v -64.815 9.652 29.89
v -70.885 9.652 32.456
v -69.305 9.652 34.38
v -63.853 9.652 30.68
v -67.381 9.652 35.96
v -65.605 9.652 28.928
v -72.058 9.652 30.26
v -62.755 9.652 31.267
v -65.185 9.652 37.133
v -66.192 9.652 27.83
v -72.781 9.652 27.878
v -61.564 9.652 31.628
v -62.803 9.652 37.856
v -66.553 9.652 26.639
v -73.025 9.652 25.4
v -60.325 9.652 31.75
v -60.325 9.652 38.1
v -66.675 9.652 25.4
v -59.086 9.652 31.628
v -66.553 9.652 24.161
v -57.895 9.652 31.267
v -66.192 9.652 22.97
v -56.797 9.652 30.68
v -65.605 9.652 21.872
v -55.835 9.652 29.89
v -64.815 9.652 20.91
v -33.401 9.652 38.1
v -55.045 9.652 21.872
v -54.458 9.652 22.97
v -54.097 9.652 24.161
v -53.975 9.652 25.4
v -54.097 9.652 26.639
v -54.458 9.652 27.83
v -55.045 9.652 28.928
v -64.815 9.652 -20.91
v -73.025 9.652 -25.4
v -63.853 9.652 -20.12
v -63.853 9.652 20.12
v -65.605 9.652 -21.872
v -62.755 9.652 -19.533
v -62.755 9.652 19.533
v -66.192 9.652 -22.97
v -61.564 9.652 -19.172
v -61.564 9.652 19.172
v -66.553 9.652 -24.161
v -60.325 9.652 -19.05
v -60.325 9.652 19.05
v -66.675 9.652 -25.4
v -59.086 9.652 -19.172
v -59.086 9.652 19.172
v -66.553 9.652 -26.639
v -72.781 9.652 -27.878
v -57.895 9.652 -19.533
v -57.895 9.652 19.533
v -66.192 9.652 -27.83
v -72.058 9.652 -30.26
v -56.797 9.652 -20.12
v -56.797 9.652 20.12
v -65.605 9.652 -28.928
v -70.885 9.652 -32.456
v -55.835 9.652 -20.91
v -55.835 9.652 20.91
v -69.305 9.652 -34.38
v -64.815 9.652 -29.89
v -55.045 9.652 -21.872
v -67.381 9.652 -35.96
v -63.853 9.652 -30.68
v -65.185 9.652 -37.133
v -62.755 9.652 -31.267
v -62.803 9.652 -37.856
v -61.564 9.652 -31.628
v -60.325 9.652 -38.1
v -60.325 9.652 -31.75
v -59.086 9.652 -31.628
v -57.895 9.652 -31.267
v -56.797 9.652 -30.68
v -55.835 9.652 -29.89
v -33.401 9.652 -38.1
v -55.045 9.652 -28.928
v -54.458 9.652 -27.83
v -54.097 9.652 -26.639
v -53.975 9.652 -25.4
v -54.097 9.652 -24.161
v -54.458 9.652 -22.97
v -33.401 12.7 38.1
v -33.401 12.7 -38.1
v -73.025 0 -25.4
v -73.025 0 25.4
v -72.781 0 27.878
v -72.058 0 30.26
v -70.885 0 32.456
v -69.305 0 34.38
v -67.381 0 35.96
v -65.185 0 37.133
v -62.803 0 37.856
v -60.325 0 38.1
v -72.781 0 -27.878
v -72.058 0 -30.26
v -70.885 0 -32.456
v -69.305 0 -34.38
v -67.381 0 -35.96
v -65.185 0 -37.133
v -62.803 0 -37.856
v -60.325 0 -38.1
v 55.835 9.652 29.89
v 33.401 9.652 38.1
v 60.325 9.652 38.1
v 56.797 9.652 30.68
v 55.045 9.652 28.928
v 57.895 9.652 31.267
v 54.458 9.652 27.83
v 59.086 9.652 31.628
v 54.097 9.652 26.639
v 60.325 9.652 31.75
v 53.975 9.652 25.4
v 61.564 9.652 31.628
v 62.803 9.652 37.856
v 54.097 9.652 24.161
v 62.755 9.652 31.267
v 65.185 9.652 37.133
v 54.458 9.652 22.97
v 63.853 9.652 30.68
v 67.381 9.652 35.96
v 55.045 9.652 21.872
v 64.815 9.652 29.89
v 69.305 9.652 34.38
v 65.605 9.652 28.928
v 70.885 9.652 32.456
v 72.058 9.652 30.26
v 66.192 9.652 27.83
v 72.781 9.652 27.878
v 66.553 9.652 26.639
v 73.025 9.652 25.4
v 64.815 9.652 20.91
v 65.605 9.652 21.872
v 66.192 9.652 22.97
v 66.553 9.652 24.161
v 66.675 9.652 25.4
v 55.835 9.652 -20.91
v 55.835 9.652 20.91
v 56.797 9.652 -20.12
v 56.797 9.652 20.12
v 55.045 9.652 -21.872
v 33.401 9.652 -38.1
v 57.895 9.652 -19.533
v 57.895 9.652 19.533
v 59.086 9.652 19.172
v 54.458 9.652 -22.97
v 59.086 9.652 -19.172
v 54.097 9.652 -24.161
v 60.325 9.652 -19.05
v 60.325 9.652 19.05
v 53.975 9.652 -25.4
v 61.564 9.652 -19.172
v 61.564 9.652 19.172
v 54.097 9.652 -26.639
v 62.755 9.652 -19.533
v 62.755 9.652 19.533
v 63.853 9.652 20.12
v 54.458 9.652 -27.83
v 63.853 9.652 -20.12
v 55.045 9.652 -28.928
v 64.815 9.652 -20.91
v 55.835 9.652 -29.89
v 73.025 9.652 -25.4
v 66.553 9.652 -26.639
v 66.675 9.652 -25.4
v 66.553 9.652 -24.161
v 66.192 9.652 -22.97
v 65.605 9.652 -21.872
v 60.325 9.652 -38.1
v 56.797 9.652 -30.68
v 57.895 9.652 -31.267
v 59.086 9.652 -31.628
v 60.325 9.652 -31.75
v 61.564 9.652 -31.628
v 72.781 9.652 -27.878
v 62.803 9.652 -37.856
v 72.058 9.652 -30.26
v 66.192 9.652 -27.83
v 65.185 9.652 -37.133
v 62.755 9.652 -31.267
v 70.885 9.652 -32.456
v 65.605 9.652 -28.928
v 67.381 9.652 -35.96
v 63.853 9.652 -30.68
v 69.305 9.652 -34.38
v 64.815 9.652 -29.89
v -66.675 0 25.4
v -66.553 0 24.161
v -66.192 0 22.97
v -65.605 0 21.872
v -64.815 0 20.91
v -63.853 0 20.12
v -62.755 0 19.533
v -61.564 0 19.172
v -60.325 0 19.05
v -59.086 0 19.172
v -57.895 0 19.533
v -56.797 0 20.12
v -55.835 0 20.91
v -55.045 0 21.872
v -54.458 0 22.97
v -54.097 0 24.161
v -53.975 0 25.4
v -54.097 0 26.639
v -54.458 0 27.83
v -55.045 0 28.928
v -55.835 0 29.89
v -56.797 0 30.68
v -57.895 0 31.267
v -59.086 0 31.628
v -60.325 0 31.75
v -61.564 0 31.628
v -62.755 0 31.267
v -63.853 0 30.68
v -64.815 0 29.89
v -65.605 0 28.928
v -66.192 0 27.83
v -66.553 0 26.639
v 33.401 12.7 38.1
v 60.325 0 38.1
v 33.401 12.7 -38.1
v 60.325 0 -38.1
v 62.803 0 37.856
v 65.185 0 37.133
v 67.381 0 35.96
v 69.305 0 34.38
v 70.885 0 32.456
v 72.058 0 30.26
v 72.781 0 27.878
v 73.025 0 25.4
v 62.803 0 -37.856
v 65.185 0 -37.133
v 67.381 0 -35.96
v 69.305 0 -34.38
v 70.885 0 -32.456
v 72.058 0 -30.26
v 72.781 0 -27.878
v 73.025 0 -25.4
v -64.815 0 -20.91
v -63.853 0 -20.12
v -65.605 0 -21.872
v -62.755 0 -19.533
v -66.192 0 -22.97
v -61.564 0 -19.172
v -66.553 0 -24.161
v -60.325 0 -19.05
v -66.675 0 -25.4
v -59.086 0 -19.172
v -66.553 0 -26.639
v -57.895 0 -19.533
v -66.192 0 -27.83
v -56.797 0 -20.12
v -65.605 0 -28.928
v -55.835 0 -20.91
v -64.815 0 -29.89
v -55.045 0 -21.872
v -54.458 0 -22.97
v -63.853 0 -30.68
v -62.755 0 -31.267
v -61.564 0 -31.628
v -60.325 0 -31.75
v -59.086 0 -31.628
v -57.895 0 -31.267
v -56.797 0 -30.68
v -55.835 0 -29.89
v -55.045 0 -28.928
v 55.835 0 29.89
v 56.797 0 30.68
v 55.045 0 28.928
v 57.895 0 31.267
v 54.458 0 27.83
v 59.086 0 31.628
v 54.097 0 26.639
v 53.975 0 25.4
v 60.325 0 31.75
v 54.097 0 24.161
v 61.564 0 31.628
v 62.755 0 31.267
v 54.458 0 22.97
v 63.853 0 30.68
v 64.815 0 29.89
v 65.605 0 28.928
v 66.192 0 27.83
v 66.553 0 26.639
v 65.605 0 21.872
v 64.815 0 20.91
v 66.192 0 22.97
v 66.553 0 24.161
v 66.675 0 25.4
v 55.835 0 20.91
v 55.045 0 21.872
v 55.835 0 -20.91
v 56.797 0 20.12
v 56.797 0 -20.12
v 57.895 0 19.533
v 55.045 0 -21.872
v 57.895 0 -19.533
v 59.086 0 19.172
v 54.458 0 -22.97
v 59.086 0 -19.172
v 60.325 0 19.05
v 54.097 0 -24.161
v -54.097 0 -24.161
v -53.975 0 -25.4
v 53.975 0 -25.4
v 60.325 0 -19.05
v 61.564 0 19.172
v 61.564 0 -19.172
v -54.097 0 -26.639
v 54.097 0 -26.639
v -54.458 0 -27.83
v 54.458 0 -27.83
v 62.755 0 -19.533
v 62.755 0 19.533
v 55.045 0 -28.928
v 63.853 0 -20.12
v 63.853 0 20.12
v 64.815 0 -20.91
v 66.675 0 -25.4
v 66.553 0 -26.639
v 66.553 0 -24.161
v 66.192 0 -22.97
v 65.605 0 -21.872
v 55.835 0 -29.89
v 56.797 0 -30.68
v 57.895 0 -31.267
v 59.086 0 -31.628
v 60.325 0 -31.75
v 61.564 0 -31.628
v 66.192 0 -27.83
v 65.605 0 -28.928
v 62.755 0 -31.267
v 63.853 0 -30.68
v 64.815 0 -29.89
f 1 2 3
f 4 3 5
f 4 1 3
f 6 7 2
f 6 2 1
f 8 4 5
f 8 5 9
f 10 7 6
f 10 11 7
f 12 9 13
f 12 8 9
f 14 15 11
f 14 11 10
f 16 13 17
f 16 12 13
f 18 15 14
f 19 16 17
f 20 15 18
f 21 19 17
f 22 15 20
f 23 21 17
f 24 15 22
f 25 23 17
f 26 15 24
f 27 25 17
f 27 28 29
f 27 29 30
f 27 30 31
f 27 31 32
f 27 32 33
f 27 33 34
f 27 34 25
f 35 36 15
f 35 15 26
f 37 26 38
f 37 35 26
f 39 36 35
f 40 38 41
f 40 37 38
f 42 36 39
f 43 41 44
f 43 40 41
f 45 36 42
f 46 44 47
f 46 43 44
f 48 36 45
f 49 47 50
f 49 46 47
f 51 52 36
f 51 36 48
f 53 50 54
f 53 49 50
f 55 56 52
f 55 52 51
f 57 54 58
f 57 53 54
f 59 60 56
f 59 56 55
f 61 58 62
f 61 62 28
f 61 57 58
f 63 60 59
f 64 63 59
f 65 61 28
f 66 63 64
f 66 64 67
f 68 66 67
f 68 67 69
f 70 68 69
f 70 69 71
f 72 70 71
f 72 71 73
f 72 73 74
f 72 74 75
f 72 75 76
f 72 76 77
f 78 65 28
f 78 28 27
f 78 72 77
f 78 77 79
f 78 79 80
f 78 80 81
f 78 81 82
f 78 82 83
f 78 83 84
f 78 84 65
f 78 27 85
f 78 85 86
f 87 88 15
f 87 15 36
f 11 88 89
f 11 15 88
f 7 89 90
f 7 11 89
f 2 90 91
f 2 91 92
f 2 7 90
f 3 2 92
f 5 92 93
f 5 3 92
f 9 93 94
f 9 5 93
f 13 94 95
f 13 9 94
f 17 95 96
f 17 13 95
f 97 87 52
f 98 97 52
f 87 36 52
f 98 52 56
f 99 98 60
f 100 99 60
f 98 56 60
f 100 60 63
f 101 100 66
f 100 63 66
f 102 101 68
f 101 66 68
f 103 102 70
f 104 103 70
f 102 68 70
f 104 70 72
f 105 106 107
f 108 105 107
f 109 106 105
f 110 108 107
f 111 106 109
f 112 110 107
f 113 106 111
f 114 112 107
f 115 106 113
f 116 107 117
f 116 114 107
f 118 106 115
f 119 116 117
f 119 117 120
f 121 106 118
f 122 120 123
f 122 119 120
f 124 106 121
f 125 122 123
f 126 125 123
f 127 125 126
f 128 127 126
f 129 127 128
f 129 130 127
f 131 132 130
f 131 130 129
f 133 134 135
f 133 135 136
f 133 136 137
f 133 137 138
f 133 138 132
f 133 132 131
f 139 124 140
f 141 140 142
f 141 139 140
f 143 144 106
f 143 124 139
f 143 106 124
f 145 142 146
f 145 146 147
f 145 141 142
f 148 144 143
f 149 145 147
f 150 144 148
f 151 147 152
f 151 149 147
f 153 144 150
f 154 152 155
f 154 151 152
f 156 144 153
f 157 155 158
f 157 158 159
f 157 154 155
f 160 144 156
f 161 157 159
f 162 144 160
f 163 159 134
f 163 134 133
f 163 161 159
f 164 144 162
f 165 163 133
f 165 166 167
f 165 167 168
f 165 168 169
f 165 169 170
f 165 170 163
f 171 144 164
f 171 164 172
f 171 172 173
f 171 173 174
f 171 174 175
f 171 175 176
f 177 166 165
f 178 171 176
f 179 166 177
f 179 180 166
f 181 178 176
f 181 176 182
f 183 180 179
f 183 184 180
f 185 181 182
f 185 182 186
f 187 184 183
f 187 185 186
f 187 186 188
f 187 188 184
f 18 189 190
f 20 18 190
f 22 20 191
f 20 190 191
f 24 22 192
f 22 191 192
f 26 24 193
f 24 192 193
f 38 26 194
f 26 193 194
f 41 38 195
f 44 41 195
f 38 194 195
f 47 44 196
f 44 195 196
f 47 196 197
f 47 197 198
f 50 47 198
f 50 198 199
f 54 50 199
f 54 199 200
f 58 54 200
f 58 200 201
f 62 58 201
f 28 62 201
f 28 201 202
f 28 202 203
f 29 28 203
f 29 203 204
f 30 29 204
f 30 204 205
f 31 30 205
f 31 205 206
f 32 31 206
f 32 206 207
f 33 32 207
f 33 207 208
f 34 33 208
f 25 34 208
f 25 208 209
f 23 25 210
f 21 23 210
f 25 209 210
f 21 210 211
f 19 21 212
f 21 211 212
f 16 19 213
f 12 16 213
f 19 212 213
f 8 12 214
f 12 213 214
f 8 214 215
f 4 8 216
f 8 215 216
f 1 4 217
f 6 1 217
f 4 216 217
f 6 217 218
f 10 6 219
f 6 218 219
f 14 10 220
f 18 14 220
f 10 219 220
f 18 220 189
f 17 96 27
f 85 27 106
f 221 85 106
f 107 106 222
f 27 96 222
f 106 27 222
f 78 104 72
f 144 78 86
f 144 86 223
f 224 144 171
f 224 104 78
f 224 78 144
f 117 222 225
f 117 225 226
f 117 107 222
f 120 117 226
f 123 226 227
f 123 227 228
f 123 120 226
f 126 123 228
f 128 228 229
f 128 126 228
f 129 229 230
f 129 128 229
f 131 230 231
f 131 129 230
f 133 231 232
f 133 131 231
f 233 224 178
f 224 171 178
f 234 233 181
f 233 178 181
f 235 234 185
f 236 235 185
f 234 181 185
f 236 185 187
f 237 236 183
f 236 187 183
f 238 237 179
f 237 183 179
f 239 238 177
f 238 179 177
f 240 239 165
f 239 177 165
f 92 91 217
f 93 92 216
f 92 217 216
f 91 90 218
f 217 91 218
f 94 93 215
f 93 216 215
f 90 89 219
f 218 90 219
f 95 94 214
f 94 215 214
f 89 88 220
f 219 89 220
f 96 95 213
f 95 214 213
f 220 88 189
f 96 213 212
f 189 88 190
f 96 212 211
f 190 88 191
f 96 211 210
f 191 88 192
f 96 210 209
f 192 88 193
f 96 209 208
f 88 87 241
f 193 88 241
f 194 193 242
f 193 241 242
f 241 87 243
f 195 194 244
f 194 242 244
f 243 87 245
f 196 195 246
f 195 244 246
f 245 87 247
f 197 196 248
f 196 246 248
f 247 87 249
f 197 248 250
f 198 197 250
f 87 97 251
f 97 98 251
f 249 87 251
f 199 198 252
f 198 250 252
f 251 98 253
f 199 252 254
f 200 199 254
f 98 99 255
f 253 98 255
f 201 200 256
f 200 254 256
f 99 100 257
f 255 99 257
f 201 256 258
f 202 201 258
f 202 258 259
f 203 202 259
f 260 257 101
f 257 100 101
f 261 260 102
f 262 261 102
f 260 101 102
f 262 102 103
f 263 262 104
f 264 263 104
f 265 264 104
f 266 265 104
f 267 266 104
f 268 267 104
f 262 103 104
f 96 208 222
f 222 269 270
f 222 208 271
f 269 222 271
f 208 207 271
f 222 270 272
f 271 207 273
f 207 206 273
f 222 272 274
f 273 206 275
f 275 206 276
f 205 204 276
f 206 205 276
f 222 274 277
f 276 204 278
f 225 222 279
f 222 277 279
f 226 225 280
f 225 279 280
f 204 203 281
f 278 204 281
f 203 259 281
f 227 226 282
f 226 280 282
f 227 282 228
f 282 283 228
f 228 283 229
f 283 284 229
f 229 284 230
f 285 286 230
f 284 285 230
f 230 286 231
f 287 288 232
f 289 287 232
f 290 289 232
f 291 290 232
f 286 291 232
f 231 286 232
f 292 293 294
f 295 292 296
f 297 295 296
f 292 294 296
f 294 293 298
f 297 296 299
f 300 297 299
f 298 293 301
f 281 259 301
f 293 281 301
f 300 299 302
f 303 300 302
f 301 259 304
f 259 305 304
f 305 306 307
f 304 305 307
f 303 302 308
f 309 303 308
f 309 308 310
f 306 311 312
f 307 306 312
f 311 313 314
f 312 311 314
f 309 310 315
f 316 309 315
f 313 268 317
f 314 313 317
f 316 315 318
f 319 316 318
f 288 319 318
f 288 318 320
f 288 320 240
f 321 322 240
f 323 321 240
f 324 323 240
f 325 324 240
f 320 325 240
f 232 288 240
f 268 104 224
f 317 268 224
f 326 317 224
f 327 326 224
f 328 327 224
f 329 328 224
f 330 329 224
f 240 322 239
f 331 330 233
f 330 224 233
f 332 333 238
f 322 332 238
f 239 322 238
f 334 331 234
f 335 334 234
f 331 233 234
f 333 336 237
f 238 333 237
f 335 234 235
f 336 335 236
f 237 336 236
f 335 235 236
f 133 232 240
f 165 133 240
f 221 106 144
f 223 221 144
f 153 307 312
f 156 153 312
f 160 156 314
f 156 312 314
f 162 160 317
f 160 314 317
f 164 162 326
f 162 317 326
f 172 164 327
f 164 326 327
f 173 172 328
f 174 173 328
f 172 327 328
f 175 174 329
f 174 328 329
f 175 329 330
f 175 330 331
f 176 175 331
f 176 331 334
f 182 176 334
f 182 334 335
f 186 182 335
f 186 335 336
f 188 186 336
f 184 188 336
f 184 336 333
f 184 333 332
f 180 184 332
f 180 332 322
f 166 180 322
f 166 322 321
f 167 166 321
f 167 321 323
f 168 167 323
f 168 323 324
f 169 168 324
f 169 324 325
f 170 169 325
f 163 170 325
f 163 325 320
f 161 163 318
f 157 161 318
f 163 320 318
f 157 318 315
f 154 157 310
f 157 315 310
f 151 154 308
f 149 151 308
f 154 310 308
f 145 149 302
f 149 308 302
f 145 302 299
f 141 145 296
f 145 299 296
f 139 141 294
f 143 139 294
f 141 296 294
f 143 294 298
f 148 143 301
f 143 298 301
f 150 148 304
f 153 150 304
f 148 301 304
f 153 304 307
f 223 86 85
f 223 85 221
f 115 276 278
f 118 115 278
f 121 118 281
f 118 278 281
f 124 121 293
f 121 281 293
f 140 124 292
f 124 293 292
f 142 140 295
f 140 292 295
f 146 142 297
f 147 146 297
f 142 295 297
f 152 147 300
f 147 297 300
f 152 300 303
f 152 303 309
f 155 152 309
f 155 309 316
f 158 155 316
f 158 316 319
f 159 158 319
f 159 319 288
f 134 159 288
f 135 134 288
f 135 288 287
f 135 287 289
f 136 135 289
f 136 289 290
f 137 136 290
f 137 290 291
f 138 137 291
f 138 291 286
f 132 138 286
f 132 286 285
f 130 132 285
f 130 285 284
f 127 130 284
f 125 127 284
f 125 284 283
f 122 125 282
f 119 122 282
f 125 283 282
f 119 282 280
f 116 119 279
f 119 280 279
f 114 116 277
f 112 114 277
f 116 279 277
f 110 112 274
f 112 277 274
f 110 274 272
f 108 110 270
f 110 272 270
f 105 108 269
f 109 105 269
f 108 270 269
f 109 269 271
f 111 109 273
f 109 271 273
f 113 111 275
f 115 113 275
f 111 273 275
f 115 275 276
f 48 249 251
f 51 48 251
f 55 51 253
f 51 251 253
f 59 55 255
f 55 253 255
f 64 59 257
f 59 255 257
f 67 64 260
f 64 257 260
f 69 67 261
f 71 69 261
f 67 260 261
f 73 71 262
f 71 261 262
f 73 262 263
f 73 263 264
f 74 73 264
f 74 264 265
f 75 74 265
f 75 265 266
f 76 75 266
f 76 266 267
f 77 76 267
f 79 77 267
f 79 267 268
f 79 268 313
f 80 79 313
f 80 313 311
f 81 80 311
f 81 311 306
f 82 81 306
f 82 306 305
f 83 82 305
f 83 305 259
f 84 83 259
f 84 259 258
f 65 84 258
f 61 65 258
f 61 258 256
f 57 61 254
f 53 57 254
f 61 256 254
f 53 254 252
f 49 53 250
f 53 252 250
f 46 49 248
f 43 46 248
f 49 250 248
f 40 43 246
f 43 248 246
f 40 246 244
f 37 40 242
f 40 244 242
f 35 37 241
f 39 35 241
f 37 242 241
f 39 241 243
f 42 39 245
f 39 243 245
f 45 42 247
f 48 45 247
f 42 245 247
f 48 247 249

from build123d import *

# Parameters (mm, degrees)
SKETCH1_W                  = 146.05
SKETCH1_H                  = 76.2
BOSS_EXTRUDE1_DEPTH        = 9.652
SKETCH3_W                  = 66.802
SKETCH3_H                  = 76.2
BOSS_EXTRUDE2_DEPTH        = 3.048
FILLET1_R                  = 12.7
F_1_4_0_5_DIAMETER_HOLE1_D = 12.7


with BuildPart() as part:
    # Sketch1 → Boss-Extrude1 (new body)
    with BuildSketch(Plane(origin=(0, 0, 0), x_dir=(1, 0, 0), z_dir=(0, 1, 0))):
        Rectangle(SKETCH1_W, SKETCH1_H)
    extrude(amount=BOSS_EXTRUDE1_DEPTH)

    # Sketch3 → Boss-Extrude2 (add)
    with BuildSketch(Plane(origin=(0, 9.652, 0), x_dir=(1, 0, 0), z_dir=(0, 1, 0))):
        Rectangle(SKETCH3_W, SKETCH3_H)
    extrude(amount=BOSS_EXTRUDE2_DEPTH)

    # Fillet1
    fillet1_edges = [part.edges().sort_by_distance(p)[0] for p in [
        (73.025, 4.826, 38.1),
        (-73.025, 4.826, 38.1),
        (-73.025, 4.826, -38.1),
        (73.025, 4.826, -38.1),
    ]]
    fillet(fillet1_edges, radius=FILLET1_R)

    # 1/4 (0.5) Diameter Hole1 (through all)
    with Locations(Plane(origin=(0, 9.652, 0), x_dir=(1, 0, 0), z_dir=(0, 1, 0))):
        with Locations((-60.325, 25.4), (-60.325, -25.4), (60.325, -25.4), (60.325, 25.4)):
            Hole(F_1_4_0_5_DIAMETER_HOLE1_D / 2)


solid = part.part
